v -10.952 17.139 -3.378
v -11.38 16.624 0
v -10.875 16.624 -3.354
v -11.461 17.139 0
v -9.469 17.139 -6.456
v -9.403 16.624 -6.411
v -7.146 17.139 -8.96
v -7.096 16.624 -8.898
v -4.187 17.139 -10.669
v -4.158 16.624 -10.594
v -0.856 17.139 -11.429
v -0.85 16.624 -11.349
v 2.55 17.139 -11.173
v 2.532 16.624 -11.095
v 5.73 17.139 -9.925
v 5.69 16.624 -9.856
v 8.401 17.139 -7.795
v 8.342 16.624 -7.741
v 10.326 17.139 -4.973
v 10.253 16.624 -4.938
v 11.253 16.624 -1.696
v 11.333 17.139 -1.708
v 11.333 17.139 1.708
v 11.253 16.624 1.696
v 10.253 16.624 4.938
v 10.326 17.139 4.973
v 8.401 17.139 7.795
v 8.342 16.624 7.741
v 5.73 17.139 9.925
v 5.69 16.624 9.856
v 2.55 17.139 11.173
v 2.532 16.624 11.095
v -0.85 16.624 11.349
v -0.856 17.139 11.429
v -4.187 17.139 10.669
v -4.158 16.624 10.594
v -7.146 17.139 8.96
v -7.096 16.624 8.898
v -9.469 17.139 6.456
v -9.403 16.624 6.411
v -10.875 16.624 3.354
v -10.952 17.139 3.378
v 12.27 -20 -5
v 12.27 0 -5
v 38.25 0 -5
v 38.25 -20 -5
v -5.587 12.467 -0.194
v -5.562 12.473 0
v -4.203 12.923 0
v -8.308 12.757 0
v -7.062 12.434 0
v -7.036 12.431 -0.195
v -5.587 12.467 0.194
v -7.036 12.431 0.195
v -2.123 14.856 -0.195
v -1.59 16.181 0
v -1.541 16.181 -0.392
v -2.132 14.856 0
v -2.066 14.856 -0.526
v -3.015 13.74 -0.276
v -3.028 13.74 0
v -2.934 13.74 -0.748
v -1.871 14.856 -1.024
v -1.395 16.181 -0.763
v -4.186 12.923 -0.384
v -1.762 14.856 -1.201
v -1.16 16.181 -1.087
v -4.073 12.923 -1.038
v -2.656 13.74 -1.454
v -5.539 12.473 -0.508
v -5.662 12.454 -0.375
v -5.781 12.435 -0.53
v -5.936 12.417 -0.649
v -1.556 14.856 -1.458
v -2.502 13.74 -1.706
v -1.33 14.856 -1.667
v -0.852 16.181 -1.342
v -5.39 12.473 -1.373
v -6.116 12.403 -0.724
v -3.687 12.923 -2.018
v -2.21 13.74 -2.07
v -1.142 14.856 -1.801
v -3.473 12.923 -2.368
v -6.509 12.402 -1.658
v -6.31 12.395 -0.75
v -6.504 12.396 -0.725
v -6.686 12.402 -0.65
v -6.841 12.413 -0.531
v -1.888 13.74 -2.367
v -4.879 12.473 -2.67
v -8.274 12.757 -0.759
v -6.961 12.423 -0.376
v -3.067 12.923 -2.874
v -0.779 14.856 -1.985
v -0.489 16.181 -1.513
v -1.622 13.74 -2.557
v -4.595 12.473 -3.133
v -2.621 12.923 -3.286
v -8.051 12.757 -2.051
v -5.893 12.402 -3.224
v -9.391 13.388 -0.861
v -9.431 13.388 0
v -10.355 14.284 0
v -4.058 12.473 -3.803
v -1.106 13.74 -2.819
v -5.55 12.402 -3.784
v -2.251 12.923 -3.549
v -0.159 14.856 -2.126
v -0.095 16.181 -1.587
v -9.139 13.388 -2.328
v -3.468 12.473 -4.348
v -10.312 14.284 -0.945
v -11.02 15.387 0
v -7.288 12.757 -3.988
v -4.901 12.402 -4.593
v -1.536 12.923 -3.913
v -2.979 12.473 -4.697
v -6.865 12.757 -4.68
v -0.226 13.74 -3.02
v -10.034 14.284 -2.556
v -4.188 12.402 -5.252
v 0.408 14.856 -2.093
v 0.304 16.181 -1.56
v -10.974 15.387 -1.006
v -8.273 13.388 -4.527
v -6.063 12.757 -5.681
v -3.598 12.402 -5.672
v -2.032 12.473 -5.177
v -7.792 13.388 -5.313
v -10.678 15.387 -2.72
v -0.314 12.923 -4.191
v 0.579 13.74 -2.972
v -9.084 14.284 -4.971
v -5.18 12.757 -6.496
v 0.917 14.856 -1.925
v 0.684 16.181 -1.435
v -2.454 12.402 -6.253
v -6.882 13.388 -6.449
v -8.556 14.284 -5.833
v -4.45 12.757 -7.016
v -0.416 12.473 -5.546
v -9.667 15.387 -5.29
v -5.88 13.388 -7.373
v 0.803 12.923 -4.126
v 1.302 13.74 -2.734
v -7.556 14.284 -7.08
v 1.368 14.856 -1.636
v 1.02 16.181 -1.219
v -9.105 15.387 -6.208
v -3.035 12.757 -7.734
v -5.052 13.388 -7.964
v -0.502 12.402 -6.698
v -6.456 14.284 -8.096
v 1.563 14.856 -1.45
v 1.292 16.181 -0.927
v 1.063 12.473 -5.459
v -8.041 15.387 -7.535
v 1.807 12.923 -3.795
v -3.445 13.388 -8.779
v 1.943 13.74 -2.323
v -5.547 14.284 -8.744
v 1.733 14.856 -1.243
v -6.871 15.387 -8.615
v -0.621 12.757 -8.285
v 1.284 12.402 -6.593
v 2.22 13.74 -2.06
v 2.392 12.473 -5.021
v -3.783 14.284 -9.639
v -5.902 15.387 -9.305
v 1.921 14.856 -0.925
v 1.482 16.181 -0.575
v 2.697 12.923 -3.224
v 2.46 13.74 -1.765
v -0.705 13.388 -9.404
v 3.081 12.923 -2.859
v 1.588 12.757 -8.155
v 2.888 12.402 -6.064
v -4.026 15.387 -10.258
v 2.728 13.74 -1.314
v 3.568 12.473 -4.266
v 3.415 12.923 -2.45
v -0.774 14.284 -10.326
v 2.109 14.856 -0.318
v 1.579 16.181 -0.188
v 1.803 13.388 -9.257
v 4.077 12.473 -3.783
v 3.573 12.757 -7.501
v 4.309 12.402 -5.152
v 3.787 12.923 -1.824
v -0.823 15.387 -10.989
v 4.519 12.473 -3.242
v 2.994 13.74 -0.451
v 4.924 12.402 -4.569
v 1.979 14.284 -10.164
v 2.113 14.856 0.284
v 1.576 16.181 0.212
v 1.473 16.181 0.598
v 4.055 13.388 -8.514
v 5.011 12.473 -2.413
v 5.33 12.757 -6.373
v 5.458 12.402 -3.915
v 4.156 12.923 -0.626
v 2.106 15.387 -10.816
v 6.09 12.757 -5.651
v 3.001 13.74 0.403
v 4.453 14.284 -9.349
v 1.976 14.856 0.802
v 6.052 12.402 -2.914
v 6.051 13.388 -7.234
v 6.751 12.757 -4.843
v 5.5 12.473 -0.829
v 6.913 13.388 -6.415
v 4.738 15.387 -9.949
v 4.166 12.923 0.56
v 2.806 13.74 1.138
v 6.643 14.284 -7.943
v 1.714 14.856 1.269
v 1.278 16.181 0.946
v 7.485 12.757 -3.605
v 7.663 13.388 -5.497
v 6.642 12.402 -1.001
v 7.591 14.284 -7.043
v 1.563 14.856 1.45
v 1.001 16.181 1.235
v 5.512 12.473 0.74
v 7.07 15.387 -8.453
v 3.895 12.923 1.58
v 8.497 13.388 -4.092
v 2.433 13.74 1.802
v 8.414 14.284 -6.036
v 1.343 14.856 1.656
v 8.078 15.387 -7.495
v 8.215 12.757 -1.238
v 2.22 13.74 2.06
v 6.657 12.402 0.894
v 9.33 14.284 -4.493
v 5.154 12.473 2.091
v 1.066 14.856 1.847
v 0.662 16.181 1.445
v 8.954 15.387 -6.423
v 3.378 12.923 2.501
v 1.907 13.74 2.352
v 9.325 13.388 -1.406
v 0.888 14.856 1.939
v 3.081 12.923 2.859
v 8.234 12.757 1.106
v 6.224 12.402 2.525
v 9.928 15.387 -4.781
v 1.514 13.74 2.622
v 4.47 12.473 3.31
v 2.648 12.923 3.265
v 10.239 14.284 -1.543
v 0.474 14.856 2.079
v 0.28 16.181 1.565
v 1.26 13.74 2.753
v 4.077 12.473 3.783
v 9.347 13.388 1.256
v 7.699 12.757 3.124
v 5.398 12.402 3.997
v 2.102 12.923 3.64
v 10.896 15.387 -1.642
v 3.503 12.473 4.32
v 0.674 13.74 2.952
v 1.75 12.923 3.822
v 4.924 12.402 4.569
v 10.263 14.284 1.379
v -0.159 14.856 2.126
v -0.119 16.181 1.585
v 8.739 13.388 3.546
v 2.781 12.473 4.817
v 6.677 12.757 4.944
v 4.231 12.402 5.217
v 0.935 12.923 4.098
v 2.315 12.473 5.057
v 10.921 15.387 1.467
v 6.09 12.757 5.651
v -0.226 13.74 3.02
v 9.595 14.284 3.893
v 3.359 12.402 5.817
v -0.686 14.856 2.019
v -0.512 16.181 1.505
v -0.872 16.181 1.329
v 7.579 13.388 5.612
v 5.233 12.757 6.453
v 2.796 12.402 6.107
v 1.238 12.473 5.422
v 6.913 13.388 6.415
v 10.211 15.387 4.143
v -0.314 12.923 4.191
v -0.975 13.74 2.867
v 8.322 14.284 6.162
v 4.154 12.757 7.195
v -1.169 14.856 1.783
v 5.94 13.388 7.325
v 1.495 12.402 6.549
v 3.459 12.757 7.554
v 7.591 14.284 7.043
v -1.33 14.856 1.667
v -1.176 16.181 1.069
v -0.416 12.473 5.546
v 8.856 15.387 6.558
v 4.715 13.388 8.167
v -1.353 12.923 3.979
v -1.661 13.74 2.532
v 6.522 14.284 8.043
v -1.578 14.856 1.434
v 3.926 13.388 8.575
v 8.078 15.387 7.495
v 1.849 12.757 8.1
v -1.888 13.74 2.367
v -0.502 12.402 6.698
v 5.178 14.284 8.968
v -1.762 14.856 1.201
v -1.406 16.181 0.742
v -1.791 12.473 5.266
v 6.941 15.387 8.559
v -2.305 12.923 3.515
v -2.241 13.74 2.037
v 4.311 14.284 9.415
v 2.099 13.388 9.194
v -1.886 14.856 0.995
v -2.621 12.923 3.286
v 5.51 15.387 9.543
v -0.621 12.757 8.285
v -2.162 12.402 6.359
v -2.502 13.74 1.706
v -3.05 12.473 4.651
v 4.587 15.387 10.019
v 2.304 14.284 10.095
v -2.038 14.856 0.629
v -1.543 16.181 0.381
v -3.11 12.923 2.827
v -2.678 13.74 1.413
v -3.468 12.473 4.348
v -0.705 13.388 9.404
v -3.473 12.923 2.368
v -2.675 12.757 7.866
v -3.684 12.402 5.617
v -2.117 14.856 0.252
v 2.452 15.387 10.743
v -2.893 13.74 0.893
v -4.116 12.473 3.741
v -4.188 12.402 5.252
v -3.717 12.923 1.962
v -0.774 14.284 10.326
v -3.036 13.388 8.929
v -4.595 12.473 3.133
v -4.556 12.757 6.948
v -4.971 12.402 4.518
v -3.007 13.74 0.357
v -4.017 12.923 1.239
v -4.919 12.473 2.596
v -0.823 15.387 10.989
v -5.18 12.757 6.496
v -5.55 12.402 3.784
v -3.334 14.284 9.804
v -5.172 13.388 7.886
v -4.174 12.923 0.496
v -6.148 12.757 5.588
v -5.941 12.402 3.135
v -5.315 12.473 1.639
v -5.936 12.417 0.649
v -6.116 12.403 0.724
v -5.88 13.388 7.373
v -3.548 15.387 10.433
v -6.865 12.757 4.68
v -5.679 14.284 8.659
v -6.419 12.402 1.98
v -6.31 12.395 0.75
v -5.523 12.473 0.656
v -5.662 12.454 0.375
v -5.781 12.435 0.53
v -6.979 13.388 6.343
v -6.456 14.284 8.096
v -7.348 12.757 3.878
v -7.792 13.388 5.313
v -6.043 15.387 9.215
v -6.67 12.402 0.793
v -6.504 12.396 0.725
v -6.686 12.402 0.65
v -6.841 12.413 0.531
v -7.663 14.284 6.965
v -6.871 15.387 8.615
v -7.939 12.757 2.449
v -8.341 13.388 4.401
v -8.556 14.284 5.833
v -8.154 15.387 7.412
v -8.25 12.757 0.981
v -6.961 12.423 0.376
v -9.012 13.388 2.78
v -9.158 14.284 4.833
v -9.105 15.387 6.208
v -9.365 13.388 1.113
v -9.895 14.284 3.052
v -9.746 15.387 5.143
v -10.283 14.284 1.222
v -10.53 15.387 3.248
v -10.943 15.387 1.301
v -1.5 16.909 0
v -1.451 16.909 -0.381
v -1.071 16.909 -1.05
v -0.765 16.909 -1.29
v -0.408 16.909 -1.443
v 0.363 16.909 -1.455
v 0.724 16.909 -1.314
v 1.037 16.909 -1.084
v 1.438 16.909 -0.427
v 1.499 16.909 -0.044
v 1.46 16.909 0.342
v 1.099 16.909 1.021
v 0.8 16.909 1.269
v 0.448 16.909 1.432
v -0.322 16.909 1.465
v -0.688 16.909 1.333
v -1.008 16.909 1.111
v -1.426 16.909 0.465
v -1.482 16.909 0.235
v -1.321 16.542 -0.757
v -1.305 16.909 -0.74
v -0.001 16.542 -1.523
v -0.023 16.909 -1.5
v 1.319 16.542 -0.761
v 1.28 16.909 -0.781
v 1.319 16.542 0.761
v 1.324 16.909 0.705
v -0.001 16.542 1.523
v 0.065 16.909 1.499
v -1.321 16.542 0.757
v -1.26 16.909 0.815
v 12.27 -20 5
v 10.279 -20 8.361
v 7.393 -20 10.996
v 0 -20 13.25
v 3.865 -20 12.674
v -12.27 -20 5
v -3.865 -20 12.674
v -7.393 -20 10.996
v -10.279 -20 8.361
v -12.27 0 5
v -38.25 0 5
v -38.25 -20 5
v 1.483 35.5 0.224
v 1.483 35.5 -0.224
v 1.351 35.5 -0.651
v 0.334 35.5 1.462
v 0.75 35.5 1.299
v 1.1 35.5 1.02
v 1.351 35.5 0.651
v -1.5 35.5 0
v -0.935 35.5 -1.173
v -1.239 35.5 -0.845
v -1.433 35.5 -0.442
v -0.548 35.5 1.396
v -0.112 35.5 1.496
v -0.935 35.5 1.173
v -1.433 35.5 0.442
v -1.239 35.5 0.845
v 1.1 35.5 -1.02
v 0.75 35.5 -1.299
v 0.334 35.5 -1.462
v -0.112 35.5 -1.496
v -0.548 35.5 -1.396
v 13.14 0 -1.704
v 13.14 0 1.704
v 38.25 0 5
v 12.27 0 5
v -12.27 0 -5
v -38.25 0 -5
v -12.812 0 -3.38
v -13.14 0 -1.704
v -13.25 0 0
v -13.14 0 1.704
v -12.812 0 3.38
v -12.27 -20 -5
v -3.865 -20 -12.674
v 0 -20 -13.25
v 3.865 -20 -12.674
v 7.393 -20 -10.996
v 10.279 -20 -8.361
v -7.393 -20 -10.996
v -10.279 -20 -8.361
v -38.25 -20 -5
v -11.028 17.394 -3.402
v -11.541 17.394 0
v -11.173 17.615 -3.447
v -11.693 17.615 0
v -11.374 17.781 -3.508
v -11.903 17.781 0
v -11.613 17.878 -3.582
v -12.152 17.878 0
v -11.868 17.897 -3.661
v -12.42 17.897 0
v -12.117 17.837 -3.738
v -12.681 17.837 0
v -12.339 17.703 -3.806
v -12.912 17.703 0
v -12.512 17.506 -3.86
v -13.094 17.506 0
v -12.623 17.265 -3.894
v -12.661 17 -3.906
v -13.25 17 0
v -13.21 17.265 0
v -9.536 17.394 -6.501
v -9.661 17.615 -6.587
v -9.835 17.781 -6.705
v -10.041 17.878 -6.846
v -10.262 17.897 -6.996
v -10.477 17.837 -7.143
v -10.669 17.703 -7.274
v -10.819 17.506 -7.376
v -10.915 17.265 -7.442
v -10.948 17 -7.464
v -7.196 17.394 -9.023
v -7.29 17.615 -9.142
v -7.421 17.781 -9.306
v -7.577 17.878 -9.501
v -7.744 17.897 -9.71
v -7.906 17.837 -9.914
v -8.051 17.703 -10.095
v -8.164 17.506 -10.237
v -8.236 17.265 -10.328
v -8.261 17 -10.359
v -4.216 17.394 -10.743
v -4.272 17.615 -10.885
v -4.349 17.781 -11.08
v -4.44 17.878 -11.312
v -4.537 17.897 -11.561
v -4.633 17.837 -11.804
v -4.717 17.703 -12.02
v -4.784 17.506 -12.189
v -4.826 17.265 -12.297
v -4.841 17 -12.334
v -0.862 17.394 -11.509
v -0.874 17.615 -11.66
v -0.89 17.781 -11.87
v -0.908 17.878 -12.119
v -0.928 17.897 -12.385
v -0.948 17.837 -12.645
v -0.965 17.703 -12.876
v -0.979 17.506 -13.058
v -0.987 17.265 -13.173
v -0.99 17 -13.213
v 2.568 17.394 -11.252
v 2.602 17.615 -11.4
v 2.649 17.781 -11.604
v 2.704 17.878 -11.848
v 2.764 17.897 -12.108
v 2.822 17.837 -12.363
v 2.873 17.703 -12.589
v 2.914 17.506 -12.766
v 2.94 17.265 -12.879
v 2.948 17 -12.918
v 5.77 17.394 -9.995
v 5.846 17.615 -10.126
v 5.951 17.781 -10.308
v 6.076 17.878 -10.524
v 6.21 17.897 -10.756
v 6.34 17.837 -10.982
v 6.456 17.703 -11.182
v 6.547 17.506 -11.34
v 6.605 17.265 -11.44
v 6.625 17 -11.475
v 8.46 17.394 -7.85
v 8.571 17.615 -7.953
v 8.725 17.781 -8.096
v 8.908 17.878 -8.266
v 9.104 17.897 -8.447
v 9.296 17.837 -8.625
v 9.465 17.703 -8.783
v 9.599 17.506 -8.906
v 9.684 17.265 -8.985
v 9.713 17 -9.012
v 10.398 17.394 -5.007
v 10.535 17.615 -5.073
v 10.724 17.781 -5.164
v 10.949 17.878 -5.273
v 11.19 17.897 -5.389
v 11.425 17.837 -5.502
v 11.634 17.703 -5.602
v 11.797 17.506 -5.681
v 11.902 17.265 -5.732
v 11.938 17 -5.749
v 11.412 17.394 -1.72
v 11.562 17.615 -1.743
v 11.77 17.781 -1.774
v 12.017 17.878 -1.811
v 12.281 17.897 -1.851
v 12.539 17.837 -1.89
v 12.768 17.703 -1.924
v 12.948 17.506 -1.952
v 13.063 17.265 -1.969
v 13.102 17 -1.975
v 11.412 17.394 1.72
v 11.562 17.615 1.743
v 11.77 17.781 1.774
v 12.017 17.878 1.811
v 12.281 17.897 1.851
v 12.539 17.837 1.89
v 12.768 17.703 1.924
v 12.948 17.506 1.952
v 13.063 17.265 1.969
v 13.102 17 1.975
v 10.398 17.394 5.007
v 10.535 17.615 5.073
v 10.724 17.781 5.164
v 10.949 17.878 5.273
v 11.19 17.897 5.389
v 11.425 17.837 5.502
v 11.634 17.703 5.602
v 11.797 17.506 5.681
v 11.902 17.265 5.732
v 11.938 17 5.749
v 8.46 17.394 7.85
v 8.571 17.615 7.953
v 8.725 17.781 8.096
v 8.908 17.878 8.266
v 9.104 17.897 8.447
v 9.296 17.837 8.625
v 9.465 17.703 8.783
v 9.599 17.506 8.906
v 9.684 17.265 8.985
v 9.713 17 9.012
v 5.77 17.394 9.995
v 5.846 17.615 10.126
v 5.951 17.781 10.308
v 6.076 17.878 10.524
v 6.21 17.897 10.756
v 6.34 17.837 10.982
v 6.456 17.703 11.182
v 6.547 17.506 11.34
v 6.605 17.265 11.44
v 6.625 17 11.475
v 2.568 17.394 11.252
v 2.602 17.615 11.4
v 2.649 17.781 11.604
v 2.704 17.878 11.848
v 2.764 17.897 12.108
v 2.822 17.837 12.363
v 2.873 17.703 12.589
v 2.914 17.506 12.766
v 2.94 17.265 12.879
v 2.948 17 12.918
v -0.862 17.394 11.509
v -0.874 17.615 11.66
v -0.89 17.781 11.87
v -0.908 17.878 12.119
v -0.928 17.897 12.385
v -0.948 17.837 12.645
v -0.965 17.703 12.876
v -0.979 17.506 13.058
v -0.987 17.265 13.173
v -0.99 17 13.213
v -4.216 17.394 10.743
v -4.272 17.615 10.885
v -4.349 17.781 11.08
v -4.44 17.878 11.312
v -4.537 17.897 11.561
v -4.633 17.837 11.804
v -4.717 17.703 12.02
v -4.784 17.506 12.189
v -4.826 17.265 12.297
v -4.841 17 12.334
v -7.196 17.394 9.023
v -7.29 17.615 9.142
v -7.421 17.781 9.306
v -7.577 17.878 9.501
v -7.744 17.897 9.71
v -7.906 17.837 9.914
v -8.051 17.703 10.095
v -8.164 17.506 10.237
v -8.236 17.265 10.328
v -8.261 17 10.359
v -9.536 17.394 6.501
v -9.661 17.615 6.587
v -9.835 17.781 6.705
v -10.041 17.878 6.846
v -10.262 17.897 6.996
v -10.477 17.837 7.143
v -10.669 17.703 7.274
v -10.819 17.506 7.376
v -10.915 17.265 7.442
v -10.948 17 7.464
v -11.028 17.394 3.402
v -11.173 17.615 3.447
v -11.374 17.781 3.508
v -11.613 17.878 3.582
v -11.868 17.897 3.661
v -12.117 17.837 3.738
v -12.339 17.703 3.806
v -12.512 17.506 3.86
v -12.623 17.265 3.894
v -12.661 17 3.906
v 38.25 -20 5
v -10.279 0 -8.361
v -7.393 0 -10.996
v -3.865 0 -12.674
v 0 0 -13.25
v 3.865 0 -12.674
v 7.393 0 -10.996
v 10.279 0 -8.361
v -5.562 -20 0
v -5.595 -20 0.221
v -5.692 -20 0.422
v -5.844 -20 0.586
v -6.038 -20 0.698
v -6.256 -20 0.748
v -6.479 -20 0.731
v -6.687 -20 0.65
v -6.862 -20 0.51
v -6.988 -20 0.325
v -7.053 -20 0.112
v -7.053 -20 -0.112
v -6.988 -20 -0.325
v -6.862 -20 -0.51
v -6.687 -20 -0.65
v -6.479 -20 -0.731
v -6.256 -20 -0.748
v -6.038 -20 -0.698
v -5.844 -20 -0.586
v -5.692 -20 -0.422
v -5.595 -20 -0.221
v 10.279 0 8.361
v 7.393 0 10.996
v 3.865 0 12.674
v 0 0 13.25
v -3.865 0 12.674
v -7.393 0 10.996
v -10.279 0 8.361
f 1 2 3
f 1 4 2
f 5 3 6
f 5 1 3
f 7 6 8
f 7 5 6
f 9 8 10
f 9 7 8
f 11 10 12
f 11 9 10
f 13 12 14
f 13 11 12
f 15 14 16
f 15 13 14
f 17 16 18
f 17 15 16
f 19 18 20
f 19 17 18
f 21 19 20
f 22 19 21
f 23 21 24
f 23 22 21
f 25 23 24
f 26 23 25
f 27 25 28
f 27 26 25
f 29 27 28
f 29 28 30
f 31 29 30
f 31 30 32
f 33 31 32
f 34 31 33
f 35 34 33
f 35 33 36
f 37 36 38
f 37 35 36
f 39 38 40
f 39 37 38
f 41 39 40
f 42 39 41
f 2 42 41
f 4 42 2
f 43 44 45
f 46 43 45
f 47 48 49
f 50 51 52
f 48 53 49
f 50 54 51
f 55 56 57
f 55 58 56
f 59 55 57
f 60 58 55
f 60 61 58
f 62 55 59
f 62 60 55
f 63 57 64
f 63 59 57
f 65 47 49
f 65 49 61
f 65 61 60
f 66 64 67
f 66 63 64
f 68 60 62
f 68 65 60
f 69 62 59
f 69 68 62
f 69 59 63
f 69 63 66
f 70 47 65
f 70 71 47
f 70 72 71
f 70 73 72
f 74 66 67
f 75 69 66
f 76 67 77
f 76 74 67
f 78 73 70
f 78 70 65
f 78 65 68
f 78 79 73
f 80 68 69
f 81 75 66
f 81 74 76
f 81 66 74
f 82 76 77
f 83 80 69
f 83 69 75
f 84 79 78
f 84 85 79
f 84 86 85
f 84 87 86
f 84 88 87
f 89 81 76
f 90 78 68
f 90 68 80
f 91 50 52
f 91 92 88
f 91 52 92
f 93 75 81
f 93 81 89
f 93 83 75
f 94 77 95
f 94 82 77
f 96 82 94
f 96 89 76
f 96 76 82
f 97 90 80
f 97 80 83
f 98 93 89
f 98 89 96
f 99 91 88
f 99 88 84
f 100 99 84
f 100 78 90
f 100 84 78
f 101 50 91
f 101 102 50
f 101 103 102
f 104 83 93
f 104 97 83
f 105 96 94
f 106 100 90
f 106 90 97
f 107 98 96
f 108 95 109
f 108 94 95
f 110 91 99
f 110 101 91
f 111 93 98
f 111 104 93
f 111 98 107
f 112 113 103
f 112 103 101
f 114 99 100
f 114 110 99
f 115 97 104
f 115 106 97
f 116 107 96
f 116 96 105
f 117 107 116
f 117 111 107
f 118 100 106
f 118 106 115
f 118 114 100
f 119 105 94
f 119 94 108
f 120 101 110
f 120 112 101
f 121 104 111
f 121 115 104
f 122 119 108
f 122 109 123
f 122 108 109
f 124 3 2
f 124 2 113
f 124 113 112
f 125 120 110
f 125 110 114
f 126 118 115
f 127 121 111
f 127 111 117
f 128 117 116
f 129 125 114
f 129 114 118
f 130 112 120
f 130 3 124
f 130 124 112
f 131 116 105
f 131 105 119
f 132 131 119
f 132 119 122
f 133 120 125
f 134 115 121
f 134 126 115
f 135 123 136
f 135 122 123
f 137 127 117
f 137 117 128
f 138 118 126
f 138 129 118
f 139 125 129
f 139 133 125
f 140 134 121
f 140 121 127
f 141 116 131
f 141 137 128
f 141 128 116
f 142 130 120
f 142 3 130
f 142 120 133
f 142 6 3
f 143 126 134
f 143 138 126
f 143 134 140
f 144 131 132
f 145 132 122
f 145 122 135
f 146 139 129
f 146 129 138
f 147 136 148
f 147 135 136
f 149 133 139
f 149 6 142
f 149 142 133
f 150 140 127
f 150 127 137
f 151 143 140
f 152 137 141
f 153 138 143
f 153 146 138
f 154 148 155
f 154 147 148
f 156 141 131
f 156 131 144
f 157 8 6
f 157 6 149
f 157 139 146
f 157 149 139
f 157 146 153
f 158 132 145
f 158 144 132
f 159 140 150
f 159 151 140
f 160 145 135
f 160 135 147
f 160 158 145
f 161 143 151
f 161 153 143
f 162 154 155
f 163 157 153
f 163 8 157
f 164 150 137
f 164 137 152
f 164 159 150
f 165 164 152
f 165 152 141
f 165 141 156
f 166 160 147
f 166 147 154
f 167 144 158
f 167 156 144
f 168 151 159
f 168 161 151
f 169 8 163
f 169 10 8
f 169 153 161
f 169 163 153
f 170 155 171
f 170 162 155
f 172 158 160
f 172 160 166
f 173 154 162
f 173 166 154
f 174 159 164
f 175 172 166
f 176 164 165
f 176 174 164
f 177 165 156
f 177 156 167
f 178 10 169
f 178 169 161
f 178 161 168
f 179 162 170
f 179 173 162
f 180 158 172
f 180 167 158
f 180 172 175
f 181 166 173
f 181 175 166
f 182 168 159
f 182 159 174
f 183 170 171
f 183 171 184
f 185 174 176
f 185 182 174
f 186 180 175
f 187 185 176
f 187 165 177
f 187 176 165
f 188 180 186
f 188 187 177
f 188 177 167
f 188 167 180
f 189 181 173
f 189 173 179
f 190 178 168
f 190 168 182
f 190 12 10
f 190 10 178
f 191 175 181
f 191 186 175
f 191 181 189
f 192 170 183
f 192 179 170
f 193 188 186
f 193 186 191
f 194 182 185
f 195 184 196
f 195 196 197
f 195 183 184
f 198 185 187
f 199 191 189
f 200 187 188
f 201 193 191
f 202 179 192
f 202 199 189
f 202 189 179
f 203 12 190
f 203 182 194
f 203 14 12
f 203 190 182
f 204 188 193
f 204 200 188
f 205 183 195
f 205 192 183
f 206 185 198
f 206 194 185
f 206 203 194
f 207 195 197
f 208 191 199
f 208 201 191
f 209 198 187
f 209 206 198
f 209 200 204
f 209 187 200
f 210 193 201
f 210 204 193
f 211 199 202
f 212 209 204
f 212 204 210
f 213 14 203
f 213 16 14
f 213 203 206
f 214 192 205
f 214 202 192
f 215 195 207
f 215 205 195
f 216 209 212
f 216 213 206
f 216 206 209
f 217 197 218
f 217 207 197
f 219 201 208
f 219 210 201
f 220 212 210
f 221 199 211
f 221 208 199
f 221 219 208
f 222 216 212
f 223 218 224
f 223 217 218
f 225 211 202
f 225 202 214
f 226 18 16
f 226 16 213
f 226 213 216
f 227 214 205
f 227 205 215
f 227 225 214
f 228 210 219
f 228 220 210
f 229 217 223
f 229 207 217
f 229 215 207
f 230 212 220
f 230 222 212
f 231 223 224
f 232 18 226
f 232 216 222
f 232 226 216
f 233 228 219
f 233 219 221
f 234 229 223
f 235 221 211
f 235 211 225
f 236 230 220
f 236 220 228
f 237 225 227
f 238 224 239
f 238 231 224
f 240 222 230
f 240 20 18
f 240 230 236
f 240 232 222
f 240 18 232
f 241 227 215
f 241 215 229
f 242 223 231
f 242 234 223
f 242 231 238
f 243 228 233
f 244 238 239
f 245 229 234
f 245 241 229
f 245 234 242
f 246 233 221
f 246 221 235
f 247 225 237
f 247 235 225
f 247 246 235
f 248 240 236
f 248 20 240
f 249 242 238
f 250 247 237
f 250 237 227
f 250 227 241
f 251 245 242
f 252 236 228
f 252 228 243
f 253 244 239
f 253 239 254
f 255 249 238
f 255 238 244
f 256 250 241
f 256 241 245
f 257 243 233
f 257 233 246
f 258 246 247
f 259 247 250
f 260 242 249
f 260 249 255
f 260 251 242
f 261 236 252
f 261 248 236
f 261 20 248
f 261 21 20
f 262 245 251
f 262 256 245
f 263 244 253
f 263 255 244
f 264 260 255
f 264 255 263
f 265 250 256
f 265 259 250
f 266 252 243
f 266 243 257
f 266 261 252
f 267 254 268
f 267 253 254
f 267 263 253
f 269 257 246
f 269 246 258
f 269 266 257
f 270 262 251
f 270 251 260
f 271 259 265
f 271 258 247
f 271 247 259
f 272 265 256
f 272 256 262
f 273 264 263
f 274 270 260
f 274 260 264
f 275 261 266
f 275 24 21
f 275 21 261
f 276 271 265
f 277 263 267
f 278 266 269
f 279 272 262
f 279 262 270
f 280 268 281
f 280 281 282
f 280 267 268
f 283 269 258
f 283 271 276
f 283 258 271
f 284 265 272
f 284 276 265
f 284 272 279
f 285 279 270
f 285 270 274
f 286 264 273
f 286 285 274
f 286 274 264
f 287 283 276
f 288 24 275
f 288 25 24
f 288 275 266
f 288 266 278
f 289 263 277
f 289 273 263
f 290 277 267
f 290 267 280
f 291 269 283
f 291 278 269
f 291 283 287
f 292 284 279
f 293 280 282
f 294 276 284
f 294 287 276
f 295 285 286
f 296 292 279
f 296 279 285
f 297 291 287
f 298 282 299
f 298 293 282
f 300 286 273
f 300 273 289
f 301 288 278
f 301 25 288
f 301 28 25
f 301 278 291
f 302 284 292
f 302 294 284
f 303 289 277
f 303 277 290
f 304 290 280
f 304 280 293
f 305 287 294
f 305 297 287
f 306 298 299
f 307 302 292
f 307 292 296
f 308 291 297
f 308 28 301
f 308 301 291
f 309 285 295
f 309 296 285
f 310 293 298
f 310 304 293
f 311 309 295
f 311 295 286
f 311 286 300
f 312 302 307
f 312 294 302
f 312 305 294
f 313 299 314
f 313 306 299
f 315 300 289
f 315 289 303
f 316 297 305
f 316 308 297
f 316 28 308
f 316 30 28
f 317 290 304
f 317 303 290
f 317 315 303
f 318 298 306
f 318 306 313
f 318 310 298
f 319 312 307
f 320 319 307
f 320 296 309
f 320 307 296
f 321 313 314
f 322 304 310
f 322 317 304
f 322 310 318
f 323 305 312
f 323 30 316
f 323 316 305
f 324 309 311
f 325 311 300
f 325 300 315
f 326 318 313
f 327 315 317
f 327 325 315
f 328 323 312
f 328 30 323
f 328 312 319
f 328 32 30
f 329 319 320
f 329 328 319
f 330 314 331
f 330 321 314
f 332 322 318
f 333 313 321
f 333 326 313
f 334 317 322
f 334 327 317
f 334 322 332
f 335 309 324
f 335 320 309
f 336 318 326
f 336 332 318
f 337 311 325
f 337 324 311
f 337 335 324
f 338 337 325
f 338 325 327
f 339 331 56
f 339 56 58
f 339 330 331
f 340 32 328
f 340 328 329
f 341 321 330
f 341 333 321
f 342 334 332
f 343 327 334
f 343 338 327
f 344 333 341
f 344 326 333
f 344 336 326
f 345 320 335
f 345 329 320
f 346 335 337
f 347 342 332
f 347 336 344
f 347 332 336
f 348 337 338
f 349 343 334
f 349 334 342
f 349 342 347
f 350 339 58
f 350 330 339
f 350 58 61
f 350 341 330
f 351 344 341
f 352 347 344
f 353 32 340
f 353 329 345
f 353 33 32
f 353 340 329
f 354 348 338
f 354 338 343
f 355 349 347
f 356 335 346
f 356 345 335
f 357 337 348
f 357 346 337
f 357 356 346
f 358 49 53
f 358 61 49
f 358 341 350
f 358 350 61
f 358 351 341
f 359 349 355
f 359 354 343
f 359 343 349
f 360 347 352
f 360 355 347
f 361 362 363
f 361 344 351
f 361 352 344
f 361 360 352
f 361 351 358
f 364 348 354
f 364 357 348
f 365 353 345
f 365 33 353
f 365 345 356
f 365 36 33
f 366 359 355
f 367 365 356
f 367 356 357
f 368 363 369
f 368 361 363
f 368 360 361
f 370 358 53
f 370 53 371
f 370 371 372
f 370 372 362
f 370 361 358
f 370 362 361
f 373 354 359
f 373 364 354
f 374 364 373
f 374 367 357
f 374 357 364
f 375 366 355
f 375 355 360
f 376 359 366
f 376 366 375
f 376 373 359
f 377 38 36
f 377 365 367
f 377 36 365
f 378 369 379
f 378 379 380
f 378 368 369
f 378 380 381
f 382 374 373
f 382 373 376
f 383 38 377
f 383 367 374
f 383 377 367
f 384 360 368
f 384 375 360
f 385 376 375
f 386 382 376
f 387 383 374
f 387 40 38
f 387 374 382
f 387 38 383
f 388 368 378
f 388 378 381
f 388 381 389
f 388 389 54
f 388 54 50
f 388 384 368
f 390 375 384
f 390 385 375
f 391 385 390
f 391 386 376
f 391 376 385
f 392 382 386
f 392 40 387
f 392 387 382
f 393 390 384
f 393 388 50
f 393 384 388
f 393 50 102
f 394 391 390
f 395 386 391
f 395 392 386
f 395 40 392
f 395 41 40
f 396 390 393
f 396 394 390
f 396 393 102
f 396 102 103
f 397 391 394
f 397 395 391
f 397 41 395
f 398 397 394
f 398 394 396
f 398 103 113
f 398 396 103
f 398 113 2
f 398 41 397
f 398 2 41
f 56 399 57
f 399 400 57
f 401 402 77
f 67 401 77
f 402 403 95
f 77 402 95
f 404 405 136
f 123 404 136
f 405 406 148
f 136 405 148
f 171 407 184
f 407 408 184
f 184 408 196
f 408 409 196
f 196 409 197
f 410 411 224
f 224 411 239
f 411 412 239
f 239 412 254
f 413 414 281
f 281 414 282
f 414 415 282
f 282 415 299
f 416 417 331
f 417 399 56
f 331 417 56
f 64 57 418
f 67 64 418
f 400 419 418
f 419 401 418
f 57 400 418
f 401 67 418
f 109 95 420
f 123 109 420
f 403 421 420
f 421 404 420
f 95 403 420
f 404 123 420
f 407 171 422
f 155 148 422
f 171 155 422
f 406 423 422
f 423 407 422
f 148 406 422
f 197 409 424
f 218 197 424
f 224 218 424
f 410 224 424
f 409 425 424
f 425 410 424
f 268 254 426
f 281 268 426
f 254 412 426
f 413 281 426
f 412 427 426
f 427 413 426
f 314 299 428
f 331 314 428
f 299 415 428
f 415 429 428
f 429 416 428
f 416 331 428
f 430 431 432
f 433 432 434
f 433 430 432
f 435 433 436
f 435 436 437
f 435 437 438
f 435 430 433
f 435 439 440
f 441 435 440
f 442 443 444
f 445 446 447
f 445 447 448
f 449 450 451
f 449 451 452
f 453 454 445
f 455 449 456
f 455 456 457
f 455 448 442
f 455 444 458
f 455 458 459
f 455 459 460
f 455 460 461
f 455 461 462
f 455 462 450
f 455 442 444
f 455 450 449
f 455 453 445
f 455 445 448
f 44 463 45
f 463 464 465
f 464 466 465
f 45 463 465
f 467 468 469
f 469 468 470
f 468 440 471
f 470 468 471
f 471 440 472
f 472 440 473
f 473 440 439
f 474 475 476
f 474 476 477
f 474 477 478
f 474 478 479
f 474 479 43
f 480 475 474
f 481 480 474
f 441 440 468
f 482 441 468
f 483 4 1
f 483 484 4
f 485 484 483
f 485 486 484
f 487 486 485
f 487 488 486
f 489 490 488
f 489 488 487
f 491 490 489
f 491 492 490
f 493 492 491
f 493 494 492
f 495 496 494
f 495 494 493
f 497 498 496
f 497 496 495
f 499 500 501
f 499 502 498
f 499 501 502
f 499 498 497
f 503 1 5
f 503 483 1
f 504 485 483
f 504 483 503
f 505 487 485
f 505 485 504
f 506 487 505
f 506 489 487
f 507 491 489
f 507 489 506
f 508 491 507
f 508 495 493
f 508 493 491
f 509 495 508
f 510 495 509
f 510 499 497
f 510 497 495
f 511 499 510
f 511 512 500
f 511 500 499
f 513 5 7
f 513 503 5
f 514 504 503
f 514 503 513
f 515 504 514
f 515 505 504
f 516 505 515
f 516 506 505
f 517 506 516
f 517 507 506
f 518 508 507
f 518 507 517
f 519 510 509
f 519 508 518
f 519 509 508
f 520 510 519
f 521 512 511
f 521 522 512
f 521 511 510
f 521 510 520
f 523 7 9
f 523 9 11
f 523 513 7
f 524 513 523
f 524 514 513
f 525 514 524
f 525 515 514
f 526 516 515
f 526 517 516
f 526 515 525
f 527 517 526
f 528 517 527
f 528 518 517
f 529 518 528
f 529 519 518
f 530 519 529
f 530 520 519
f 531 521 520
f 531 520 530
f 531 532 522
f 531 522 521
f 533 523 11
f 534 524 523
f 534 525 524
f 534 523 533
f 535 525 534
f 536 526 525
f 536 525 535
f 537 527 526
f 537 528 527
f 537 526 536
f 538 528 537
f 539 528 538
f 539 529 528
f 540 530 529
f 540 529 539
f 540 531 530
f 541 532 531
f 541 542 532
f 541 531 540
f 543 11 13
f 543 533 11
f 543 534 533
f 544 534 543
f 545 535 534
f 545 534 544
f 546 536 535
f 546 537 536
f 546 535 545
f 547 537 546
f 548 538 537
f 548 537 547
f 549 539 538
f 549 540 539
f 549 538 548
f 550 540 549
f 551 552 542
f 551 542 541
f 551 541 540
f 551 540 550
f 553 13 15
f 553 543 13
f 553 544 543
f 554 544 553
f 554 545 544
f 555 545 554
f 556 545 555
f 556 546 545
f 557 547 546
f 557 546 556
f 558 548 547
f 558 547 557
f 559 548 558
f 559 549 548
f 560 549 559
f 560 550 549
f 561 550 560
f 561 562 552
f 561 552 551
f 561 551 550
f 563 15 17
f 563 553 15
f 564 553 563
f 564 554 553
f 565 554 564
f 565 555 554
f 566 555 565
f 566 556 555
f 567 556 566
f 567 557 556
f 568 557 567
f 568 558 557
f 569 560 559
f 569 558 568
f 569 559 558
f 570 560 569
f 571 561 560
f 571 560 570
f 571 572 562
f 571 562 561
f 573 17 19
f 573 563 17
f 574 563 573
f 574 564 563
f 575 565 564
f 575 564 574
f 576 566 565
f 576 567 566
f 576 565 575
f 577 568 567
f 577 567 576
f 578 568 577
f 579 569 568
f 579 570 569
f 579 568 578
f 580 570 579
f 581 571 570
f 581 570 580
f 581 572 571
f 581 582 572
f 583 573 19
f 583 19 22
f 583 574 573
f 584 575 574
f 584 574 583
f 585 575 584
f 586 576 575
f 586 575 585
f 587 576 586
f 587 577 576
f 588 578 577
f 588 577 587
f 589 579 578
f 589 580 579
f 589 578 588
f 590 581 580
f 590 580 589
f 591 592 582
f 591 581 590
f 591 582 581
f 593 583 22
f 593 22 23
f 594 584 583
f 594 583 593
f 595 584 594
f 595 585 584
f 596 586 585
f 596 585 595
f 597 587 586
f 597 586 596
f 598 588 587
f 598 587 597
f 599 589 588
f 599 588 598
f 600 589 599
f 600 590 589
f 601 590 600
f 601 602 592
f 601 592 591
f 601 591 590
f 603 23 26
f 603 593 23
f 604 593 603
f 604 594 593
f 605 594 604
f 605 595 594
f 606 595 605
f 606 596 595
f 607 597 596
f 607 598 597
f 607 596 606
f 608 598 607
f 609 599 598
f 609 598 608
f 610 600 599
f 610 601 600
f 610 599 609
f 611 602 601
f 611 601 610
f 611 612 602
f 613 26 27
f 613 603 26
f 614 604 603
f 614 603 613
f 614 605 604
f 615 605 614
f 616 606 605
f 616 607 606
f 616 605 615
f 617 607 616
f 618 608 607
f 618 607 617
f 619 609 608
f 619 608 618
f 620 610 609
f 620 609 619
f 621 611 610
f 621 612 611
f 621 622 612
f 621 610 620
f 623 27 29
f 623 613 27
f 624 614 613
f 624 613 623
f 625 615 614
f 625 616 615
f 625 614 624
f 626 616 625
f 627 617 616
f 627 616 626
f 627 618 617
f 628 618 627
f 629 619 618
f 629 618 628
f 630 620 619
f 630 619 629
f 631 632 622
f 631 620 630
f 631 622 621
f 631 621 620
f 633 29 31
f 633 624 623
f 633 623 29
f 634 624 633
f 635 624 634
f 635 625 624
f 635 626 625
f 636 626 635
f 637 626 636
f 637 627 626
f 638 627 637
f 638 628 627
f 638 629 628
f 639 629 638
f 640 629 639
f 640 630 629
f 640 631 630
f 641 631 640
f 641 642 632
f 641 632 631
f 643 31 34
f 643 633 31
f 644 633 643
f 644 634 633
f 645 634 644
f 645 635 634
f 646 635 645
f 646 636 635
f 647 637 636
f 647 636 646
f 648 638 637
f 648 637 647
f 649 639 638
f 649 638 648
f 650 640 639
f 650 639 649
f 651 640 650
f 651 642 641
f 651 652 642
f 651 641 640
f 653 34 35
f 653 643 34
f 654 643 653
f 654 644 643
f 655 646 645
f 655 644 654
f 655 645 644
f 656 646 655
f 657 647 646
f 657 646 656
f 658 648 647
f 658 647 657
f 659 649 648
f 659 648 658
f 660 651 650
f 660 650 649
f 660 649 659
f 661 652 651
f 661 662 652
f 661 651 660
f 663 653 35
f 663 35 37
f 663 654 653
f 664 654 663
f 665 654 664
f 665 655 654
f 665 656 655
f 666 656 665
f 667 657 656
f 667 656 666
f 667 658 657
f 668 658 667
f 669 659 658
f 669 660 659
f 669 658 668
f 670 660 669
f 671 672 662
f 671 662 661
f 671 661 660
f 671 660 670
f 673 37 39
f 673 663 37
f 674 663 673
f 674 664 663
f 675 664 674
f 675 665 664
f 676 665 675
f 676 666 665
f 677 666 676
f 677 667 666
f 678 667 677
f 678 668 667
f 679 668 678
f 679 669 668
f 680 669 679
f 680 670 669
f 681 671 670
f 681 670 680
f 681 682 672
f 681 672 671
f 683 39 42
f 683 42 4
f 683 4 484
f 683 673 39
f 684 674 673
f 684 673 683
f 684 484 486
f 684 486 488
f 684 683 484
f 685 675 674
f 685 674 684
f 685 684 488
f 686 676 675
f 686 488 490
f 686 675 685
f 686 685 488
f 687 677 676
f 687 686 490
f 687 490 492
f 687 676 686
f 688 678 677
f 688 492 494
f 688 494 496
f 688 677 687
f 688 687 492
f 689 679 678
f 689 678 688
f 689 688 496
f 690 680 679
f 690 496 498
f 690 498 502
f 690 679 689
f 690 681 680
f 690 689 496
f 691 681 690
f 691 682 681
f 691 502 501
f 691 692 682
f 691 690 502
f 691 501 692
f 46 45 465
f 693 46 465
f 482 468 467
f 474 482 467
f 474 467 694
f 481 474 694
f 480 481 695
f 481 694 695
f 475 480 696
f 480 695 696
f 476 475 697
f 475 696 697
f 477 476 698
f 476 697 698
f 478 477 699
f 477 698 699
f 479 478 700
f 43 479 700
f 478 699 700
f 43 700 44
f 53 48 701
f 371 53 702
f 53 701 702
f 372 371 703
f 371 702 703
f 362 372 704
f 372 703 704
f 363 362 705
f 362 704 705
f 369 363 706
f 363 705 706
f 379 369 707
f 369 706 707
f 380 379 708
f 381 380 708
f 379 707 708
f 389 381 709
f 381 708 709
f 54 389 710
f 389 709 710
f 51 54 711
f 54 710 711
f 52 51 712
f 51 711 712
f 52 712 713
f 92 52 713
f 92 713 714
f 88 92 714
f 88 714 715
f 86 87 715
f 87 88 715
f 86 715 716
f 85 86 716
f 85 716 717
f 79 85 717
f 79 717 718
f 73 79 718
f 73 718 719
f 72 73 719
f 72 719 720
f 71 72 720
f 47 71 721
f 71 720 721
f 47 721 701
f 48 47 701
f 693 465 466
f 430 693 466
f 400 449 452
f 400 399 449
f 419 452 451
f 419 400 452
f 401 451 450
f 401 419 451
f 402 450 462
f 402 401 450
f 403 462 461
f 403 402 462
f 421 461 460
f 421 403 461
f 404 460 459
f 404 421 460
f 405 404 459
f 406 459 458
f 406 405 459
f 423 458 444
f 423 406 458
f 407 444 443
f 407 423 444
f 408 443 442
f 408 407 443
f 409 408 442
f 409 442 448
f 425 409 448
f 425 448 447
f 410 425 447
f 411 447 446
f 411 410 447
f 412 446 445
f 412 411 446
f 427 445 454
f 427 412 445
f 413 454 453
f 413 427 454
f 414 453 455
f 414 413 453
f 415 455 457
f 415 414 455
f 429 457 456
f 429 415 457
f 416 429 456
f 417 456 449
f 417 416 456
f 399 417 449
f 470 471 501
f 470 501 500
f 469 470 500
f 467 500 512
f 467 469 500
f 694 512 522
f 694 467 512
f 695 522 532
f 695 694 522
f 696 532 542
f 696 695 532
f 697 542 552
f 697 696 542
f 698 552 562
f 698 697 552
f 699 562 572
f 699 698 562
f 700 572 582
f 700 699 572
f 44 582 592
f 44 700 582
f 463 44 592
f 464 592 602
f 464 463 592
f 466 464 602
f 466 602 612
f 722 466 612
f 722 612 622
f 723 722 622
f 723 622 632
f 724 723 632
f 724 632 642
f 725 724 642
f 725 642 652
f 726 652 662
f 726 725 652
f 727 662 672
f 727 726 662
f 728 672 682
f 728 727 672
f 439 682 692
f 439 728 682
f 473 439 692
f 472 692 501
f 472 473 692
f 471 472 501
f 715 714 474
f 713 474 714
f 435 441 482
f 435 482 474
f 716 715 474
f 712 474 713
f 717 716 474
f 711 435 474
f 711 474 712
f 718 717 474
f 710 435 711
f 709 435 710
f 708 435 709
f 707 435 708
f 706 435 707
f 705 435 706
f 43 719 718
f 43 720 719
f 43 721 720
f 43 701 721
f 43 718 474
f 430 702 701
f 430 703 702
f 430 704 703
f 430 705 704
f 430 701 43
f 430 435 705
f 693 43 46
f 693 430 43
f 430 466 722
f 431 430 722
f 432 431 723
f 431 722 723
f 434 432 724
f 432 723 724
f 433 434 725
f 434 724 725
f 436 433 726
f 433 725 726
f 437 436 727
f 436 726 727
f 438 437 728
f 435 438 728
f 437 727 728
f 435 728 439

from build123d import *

# Parameters (mm, degrees)
F2_R     = 3
F4_DEPTH = 20
F5_DEPTH = 20
F6_R     = 1.5
F7_DEPTH = 1.5
F8_R     = 0.75
F9_DEPTH = 55.5010001


with BuildPart() as f1:
    # F0 (on Top) → F1 (revolve)
    with BuildSketch(Plane.XY):
        with BuildLine():
            Line((-13.25, 0), (0, 0))
            Line((0, 0), (0, 37))
            Line((0, 37), (-1.5, 37))
            Line((-1.5, 37), (-1.5, 16.6235913226))
            ThreePointArc((-1.5, 16.6235913226), (-6.4401709177, 12.3947665973), (-11.3803418353, 16.6235913226))
            Line((-11.3803418353, 16.6235913226), (-11.4607692348, 17.1388115494))
            ThreePointArc((-11.4607692348, 17.1388115494), (-12.4196143352, 17.8973036522), (-13.25, 17))
            Line((-13.25, 17), (-13.25, 0))
        make_face()
    revolve(axis=Axis((0, 18.5, 0), (0, -1, 0)))

    # F2
    f2_edges = [f1.edges().sort_by_distance(p)[0] for p in [
        (1.5, 16.623591, 0),
    ]]
    fillet(f2_edges, radius=F2_R)

    # F3 (on face) → F4 (join)
    with BuildSketch(Plane.XZ):
        with BuildLine():
            Line((-12.2703911918, 5), (-38.25, 5))
            Line((-38.25, 5), (-38.25, -5))
            Line((-38.25, -5), (-12.2703911918, -5))
            ThreePointArc((-12.2703911918, -5), (-13.25, 0), (-12.2703911918, 5))
        make_face()
        with BuildLine():
            Line((12.2703911918, 5), (-12.2703911918, 5))
            ThreePointArc((-12.2703911918, 5), (-13.25, 0), (-12.2703911918, -5))
            Line((-12.2703911918, -5), (12.2703911918, -5))
            ThreePointArc((12.2703911918, -5), (13.0027916866, -2.5475298535), (13.25, 0))
            ThreePointArc((13.25, 0), (13.0027916866, 2.5475298535), (12.2703911918, 5))
        make_face()
        with BuildLine():
            Line((38.25, 5), (12.2703911918, 5))
            ThreePointArc((12.2703911918, 5), (13.0027916866, 2.5475298535), (13.25, 0))
            ThreePointArc((13.25, 0), (13.0027916866, -2.5475298535), (12.2703911918, -5))
            Line((12.2703911918, -5), (38.25, -5))
            Line((38.25, -5), (38.25, 5))
        make_face()
    extrude(amount=F4_DEPTH)

    # F5 (add): faces of the model
    f5_faces = [f1.faces().sort_by_distance(p)[0] for p in [
        (0, 0, 8.4077666552),
        (0, 0, -8.4077666552),
    ]]
    extrude(f5_faces, amount=F5_DEPTH)

    # F6 (on face) → F7 (cut)
    with BuildSketch(Plane(origin=(0, 37, 0), x_dir=(-1, 0, 0), z_dir=(0, 1, 0))):
        Circle(F6_R)
    extrude(amount=-F7_DEPTH, mode=Mode.SUBTRACT)

    # F8 (on face) → F9 (cut, through all)
    with BuildSketch(Plane.XZ.offset(20)):
        with Locations((-6.3117844984, 0)):
            Circle(F8_R)
    extrude(amount=-F9_DEPTH, mode=Mode.SUBTRACT)


solid = f1.part
